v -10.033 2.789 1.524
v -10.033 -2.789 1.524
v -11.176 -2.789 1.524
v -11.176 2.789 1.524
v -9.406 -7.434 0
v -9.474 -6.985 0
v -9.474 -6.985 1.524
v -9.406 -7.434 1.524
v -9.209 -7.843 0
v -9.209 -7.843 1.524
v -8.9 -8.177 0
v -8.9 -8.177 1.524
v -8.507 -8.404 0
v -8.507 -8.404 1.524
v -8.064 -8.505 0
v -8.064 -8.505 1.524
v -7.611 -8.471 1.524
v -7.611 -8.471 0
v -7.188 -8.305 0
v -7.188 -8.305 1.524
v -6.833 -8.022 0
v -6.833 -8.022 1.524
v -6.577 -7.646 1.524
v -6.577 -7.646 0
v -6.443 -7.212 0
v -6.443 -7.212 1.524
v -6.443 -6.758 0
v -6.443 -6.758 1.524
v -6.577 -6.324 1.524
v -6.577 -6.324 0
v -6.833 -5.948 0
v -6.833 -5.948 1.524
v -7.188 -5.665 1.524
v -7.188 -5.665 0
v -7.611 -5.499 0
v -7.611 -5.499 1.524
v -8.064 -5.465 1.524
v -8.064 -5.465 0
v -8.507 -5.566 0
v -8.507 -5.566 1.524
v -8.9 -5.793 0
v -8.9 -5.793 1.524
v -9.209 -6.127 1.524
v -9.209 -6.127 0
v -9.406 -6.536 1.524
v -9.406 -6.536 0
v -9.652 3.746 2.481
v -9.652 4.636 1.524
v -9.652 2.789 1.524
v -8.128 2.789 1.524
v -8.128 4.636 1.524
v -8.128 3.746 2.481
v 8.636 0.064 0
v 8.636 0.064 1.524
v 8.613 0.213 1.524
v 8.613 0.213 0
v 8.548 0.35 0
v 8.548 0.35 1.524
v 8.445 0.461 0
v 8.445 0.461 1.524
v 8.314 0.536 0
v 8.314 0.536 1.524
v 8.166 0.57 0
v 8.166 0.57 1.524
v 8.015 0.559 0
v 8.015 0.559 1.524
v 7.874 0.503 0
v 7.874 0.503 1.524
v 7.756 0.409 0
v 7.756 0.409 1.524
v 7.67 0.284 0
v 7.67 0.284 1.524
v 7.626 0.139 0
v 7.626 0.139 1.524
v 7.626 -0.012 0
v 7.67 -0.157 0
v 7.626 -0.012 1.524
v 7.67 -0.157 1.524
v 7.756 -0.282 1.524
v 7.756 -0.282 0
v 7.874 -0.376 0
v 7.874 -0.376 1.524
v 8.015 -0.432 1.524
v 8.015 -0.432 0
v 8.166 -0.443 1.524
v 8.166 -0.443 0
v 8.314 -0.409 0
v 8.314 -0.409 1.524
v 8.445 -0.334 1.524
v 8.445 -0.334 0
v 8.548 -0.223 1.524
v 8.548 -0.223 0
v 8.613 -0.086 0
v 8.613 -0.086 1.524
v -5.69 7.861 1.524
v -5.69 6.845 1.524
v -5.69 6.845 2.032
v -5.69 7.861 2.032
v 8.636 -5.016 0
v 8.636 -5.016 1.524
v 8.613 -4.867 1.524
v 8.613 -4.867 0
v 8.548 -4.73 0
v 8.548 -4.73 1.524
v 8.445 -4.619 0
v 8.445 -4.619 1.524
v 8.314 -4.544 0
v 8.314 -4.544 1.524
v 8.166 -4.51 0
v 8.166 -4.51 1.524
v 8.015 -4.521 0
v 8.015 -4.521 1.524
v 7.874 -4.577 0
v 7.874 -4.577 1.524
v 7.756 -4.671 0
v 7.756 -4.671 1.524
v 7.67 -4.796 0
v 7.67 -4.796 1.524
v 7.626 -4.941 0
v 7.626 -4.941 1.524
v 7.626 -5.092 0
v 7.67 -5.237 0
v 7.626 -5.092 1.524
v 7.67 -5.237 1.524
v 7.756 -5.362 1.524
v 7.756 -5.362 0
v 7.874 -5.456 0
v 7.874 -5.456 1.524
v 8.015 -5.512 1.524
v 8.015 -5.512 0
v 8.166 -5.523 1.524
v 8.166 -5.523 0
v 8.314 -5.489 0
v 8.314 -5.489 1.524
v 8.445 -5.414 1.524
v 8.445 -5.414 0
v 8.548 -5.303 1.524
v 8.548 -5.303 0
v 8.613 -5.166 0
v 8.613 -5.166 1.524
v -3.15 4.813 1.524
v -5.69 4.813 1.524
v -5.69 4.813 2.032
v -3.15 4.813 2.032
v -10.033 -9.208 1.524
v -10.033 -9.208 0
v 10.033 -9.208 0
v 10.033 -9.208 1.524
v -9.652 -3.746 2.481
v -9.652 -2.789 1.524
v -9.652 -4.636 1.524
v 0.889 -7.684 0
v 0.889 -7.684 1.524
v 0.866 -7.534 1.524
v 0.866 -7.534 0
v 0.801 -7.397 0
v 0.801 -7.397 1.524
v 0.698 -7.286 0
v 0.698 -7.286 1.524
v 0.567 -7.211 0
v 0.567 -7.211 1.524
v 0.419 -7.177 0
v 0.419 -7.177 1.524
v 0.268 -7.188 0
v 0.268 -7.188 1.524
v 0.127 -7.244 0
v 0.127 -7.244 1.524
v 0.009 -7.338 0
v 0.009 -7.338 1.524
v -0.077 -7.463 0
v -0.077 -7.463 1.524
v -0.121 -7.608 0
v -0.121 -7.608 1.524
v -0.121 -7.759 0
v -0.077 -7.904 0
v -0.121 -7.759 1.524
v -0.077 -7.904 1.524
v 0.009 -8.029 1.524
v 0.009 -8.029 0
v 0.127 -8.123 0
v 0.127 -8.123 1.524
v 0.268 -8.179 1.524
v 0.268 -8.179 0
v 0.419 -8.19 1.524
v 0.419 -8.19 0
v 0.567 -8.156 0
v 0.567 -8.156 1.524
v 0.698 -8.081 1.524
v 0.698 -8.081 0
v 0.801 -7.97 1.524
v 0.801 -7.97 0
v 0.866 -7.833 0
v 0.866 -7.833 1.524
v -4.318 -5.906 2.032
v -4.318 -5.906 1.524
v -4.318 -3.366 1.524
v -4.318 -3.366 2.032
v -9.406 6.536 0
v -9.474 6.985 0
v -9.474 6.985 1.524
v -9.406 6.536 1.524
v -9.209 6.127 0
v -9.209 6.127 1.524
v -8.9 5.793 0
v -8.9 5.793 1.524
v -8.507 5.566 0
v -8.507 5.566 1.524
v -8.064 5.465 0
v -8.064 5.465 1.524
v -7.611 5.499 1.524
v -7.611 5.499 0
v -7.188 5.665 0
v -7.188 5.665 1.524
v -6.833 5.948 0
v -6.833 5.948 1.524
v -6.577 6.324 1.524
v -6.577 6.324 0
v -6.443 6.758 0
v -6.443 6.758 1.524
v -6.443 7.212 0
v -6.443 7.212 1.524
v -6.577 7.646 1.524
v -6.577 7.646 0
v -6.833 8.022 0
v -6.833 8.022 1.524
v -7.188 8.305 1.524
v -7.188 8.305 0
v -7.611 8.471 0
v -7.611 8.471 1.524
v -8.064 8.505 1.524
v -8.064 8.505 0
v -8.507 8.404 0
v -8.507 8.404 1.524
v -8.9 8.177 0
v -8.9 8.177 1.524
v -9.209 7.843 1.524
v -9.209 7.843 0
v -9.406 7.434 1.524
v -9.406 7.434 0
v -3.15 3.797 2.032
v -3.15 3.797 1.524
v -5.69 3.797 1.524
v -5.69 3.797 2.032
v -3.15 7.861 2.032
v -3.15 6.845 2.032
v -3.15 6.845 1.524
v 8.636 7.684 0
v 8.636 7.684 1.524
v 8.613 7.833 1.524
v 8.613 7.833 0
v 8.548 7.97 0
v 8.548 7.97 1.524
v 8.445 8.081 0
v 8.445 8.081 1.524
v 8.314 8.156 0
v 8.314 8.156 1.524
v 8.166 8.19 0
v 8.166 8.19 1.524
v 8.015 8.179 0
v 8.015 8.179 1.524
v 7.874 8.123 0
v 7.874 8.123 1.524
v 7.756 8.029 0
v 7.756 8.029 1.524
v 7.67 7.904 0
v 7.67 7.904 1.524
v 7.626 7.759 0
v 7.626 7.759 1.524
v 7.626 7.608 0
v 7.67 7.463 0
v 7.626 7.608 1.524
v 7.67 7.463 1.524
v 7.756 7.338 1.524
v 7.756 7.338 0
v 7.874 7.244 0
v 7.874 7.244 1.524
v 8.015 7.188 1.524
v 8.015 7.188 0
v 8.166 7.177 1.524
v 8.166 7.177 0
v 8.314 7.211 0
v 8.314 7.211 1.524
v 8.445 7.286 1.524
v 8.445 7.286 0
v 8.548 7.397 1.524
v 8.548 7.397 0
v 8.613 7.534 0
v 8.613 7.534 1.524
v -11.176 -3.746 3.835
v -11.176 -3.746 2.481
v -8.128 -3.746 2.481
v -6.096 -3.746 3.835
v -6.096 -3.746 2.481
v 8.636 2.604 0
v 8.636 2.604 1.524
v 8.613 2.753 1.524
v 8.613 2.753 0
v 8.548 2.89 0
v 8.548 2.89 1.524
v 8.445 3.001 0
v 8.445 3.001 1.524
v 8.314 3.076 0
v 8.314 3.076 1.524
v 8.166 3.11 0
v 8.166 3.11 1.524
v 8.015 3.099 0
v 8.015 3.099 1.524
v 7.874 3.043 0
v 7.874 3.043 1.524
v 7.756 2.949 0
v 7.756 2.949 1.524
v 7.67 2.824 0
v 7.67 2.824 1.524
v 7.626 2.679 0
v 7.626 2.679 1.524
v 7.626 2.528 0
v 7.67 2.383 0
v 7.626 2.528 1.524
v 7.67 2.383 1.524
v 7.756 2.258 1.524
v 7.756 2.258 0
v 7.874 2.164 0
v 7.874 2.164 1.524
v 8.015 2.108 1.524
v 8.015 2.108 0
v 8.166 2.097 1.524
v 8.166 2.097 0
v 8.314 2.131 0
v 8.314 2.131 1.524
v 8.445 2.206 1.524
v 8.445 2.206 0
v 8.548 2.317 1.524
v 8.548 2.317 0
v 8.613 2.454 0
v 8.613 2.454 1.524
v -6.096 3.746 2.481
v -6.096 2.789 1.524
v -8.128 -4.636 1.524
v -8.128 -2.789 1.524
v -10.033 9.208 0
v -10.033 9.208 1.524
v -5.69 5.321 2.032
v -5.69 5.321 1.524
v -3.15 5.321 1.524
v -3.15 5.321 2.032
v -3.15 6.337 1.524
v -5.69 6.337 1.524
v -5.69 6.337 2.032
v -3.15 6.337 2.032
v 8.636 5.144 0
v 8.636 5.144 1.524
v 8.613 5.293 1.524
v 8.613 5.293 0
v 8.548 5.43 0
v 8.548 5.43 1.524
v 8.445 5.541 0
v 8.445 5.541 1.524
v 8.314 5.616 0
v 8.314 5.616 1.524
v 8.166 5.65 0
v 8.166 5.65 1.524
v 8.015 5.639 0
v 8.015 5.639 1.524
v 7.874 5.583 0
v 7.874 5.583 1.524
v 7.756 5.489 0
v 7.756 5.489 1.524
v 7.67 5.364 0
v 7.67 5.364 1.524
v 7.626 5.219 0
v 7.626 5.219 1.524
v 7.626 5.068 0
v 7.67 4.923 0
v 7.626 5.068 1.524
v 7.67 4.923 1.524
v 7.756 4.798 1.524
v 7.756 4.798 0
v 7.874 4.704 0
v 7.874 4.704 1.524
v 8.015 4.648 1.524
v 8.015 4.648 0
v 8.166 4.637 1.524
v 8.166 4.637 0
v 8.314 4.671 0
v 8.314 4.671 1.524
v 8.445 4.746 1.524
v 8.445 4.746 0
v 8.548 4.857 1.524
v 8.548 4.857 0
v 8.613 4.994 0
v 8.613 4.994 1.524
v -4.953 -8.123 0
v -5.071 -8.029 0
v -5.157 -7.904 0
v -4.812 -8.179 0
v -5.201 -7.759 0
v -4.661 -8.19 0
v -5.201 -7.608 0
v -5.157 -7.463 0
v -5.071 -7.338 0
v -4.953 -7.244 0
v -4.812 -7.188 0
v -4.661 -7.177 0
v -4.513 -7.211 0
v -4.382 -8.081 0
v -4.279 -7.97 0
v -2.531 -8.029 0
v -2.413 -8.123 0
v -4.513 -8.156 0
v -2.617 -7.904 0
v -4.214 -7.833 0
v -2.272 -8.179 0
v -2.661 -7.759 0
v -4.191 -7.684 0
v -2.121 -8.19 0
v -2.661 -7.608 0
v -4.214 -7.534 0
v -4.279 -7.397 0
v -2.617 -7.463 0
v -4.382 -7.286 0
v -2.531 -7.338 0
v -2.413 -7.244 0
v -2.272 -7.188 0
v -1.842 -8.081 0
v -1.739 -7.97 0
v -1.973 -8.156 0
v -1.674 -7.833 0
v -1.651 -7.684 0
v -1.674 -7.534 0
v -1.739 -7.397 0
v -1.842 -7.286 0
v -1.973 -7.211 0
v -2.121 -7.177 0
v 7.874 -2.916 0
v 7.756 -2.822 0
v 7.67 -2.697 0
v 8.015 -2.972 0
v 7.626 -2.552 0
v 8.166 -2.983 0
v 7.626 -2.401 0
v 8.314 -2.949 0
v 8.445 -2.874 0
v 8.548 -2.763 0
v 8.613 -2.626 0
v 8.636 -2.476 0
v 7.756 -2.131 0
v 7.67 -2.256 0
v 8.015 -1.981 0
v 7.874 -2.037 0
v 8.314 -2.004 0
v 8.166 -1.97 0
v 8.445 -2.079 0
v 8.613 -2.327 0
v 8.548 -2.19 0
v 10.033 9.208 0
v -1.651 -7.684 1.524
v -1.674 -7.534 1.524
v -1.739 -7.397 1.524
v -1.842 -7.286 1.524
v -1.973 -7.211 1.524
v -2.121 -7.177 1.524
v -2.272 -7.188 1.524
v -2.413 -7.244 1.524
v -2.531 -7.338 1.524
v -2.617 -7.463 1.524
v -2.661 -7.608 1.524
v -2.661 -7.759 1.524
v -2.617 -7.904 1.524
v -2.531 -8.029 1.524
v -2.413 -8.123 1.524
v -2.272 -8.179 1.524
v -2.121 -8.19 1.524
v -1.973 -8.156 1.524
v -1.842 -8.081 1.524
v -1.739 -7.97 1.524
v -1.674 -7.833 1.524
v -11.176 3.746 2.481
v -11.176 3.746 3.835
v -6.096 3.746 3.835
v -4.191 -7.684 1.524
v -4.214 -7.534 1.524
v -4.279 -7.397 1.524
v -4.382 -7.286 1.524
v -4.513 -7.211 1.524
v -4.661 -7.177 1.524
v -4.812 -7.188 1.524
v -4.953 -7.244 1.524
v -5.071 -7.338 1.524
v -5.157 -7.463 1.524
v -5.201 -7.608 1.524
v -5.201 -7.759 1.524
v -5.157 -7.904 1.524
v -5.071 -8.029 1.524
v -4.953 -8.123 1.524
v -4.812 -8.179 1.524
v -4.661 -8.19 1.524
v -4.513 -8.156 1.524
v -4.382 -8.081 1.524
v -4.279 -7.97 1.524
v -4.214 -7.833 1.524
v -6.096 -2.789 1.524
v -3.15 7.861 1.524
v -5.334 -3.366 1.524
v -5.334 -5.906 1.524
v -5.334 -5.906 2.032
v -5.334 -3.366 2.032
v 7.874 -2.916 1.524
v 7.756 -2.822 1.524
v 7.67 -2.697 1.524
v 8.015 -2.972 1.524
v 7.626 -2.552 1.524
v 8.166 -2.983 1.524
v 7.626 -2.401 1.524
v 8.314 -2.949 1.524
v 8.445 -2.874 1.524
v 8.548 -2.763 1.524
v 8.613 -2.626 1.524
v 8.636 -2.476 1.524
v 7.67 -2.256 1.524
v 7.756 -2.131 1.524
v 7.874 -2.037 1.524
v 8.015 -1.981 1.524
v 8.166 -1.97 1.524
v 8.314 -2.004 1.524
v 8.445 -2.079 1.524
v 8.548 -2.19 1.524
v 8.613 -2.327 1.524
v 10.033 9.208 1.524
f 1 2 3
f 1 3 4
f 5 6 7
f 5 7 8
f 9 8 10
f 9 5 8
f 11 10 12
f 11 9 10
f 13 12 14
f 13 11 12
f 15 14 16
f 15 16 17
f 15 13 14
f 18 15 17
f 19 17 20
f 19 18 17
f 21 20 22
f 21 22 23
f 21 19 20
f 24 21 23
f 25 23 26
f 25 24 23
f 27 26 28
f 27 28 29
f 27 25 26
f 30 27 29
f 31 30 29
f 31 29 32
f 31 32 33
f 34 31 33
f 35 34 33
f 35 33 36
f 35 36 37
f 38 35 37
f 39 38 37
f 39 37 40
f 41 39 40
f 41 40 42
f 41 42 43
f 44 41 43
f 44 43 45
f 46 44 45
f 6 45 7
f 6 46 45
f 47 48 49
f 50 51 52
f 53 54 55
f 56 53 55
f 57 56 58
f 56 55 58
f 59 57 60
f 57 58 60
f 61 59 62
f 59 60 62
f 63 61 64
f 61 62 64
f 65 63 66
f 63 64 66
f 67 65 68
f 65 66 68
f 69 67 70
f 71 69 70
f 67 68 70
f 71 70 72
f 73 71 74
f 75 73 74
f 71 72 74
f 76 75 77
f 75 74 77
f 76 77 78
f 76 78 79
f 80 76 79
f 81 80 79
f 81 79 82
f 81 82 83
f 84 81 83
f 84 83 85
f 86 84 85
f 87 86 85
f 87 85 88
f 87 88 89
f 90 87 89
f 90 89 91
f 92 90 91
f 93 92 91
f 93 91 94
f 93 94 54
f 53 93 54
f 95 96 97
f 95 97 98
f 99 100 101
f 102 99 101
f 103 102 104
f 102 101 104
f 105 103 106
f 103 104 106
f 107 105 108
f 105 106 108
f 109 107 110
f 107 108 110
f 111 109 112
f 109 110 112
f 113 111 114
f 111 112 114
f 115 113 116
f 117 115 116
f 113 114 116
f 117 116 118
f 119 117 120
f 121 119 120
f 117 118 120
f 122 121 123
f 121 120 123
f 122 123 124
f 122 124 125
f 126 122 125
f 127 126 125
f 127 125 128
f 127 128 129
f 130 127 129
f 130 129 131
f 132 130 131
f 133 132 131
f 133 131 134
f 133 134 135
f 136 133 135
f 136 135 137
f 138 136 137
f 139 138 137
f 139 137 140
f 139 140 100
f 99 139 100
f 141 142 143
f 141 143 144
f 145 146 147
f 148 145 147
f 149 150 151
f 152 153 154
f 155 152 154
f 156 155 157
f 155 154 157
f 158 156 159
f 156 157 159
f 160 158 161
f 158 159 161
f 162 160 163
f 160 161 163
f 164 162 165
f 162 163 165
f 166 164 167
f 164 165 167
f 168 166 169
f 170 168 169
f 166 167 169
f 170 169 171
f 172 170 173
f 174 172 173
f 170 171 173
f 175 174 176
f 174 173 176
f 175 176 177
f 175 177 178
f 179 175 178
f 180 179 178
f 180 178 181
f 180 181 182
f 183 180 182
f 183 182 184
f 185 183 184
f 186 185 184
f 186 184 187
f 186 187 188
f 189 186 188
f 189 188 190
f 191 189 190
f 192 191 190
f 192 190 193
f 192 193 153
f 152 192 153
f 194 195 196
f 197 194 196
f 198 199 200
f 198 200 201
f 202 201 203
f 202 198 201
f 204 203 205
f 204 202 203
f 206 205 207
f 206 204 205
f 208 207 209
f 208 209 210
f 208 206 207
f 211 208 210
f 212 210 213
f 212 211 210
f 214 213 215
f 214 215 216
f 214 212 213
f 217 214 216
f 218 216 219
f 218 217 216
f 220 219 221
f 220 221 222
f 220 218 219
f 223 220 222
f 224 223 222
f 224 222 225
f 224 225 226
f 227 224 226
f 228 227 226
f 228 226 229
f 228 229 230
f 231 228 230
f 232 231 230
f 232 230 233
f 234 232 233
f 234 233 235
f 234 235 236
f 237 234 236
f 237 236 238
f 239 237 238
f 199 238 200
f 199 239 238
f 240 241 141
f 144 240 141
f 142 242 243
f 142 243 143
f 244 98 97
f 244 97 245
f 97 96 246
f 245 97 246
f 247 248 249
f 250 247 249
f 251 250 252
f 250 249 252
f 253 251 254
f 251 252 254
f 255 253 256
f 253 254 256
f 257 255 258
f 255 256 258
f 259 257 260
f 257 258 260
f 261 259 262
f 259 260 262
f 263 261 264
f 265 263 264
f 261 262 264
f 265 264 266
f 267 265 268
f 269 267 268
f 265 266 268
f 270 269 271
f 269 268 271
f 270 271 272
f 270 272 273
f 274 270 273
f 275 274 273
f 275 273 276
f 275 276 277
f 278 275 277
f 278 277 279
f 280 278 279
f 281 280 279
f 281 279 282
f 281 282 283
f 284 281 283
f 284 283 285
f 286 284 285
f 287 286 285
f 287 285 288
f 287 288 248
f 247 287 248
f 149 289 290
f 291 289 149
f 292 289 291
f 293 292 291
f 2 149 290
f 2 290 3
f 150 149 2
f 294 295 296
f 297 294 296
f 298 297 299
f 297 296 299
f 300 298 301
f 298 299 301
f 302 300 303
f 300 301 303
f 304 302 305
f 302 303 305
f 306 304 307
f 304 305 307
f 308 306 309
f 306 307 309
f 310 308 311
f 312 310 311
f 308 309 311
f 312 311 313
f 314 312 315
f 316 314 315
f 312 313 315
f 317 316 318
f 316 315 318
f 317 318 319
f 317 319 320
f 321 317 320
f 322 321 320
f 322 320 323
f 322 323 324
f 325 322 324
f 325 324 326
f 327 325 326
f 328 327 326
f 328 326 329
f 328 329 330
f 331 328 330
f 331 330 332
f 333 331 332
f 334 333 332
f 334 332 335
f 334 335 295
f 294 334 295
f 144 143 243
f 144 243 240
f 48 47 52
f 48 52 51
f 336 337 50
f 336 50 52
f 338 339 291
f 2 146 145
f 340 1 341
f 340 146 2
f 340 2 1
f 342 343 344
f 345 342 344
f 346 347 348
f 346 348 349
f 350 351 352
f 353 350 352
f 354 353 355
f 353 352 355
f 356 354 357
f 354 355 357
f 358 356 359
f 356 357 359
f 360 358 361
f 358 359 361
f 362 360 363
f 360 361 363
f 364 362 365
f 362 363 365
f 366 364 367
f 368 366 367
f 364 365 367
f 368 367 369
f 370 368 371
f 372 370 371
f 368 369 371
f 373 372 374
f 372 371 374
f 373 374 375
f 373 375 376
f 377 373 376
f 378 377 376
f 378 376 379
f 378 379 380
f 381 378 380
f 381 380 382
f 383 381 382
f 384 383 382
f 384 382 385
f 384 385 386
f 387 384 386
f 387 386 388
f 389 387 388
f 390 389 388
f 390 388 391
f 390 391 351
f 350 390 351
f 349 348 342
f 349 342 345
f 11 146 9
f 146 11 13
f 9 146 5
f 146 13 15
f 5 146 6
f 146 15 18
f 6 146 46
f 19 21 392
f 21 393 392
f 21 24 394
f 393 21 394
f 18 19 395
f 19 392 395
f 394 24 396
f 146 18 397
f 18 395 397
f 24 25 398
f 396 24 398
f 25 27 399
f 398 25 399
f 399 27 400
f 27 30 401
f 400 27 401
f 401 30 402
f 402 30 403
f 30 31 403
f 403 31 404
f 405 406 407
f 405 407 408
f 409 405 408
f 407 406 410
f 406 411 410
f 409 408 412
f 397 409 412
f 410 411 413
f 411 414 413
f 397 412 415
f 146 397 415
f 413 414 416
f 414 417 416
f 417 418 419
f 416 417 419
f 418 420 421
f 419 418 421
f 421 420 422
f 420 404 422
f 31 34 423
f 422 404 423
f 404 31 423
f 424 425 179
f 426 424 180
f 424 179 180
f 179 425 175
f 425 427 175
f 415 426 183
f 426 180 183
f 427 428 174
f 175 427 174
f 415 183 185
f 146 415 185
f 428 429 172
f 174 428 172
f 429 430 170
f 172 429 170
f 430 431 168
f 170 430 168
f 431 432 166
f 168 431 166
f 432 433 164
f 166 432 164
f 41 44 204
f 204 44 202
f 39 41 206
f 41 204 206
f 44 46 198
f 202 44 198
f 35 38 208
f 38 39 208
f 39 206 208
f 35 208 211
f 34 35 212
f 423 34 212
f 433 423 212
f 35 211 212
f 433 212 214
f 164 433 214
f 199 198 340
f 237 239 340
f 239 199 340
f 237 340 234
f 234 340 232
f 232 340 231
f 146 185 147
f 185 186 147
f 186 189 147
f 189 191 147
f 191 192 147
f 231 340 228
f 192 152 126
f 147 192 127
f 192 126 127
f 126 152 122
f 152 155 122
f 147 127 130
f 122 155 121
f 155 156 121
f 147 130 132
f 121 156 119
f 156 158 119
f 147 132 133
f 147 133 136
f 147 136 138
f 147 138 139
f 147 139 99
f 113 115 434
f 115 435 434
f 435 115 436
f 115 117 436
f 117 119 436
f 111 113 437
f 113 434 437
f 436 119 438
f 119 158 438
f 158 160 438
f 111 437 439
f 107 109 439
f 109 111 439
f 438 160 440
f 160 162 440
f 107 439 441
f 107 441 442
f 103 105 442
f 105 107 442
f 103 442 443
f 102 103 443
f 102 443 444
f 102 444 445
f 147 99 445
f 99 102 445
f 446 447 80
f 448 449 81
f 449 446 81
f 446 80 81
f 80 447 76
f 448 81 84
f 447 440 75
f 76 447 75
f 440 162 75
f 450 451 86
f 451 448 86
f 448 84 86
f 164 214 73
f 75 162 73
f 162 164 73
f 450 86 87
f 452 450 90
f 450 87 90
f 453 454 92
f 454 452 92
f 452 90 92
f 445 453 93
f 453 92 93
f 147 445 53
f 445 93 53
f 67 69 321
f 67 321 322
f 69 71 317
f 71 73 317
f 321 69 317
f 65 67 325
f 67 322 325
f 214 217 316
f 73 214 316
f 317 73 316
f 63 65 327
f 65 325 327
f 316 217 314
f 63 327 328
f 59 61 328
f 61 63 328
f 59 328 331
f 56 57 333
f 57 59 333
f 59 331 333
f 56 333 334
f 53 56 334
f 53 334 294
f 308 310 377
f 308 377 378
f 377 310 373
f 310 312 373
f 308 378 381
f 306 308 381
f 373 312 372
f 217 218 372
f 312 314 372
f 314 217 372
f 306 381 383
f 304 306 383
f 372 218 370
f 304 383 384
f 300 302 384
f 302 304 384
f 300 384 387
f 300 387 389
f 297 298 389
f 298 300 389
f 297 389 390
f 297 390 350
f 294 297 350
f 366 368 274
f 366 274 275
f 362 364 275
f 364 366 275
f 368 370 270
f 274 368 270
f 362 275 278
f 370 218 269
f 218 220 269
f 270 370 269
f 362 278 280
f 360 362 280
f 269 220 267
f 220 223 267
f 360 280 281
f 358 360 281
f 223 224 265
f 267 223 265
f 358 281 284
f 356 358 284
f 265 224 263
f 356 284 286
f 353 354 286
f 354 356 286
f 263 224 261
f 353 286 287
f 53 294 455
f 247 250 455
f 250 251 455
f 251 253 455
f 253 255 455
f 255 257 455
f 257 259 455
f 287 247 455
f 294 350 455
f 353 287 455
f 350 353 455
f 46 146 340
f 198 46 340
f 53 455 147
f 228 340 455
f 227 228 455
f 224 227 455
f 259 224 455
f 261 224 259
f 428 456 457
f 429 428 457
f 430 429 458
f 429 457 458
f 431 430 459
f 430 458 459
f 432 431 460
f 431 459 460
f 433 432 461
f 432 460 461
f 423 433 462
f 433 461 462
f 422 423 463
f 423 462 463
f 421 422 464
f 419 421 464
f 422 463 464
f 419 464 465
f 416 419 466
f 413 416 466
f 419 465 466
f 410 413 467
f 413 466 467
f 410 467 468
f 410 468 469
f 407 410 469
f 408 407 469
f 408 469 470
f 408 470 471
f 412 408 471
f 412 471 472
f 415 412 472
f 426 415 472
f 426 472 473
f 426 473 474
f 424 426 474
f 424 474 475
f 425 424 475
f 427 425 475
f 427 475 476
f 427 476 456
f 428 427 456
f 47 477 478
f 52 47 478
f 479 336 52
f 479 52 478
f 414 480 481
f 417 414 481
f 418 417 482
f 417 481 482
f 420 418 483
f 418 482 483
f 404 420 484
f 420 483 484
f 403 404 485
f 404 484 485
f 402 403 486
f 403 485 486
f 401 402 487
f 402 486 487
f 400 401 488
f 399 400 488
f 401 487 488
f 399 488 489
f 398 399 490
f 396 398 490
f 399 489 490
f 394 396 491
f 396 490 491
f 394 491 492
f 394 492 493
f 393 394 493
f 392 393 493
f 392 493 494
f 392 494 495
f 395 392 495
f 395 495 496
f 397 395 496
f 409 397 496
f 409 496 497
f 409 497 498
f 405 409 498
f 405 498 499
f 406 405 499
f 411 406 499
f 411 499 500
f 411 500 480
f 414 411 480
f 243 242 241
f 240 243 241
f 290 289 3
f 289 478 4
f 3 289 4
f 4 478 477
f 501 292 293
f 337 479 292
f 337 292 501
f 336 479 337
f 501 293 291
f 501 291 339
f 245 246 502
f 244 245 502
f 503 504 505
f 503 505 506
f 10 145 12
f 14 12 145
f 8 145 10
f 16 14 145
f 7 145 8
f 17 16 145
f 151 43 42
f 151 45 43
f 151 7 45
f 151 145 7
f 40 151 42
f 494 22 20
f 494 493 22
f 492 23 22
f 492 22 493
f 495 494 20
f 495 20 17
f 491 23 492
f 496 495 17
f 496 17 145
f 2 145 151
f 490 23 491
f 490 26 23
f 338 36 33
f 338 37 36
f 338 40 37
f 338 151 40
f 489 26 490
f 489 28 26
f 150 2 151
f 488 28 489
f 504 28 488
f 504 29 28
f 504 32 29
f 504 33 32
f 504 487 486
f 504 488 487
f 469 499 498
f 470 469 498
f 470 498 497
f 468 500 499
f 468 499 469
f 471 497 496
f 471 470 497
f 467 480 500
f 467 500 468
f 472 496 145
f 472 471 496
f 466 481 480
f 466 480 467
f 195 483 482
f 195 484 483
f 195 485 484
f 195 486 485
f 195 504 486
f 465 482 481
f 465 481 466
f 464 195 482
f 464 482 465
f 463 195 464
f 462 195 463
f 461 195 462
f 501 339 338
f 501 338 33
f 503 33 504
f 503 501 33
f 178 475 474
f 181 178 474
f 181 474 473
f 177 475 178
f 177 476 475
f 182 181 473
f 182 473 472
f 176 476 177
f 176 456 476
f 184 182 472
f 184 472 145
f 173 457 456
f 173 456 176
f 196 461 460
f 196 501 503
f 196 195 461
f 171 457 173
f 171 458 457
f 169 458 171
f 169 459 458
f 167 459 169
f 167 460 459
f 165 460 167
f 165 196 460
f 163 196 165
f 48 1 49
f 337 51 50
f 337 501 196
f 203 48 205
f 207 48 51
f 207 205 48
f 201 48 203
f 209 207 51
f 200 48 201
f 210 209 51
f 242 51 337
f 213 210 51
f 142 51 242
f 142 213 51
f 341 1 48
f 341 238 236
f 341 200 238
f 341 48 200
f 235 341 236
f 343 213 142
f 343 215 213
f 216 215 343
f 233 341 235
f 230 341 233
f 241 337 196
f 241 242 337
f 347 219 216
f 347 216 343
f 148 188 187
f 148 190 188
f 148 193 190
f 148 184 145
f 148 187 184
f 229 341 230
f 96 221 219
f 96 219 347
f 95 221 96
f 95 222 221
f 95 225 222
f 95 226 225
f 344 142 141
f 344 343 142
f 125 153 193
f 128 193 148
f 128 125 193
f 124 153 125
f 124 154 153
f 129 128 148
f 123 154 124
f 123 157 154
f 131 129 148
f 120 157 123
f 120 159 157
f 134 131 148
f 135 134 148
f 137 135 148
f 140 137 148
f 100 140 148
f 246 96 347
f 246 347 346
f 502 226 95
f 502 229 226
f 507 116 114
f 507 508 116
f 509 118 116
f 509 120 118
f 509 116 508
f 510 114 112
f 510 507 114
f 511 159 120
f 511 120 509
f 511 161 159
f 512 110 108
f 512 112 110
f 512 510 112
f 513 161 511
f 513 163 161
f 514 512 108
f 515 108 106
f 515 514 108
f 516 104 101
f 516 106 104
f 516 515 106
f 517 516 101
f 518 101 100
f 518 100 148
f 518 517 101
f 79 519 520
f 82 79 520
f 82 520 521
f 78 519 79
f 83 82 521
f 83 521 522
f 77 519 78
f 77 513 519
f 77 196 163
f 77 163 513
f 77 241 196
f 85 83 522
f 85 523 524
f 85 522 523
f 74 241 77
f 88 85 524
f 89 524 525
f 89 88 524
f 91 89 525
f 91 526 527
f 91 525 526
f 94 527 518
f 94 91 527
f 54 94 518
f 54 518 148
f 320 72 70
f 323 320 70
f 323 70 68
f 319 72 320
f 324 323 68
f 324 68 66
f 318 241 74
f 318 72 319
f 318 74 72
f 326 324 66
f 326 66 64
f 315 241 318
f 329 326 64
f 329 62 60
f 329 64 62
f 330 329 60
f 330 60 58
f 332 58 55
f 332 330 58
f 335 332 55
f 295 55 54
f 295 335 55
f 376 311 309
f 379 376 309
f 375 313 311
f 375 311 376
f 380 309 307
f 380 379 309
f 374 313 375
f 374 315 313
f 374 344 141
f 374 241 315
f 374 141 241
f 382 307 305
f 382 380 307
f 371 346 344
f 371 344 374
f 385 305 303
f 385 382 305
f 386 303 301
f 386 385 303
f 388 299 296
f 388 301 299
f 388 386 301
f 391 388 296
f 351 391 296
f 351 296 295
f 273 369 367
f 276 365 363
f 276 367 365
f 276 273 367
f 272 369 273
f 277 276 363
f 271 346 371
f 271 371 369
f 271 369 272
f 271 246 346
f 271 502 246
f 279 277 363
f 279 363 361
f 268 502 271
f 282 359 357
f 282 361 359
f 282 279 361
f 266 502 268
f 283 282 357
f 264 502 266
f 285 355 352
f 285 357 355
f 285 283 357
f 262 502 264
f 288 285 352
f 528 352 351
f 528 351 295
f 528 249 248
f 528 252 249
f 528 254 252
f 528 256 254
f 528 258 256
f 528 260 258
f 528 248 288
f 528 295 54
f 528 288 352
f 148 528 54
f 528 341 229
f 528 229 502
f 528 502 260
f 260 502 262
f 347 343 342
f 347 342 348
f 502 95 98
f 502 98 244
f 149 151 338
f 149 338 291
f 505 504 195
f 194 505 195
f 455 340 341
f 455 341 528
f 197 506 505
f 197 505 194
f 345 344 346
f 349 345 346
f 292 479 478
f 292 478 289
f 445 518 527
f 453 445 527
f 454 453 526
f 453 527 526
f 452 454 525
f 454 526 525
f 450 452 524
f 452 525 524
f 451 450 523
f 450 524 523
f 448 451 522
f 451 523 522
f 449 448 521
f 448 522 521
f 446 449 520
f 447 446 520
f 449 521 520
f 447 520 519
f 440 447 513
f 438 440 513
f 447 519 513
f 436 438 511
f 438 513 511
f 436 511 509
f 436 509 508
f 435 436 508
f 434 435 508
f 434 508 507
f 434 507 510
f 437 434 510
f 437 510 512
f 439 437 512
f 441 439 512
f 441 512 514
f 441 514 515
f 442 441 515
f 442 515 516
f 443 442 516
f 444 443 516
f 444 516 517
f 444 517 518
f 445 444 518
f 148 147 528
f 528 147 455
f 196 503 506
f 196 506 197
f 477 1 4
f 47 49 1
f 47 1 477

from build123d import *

# Parameters (mm, degrees)
SKETCH1_W           = 20.066
SKETCH1_H           = 18.415
SKETCH1_R           = 1.524
EXTRUDE1_DEPTH      = 1.524
EXTRUDE2_DEPTH      = 1.143
EXTRUDE2_DEPTH_BACK = 3.937
SKETCH3_R           = 0.508
EXTRUDE3_DEPTH      = 15.663683105
LPATTERN1_COUNT     = 6
LPATTERN1_PITCH     = 2.54
SKETCH4_R           = 0.508
EXTRUDE4_DEPTH      = 15.663683105
LPATTERN2_COUNT     = 3
LPATTERN2_PITCH     = 2.54
SKETCH5_W           = 2.54
SKETCH5_H           = 1.016
SKETCH5_W_2         = 1.016
SKETCH5_H_2         = 2.54
KEEPAWAY_DEPTH      = 0.508
EXTRUDE6_START      = -1.524
EXTRUDE6_DEPTH      = 1.524


with BuildPart() as part:
    # Sketch1 → Extrude1 (new body)
    with BuildSketch(Plane.XY):
        Rectangle(SKETCH1_W, SKETCH1_H)
        with Locations(Location((-7.9502, 6.985, 0), (0, 0, 180))):
            Circle(SKETCH1_R, mode=Mode.SUBTRACT)
        with Locations(Location((-7.9502, -6.985, 0), (0, 0, 180))):
            Circle(SKETCH1_R, mode=Mode.SUBTRACT)
    extrude(amount=EXTRUDE1_DEPTH)

    # Sketch2 → Extrude2 (add, two sides: drawn at the far end of the back side and taken through both)
    with BuildSketch(Plane.ZY.offset(10.033).offset(-EXTRUDE2_DEPTH_BACK)):
        Polygon((3.8354, 3.7465), (3.8354, -3.7465), (2.481413228, -3.7465), (1.524, -2.789086772), (1.524, 2.789086772), (2.481413228, 3.7465), align=None)
    extrude(amount=EXTRUDE2_DEPTH + EXTRUDE2_DEPTH_BACK)

    # Sketch3 → Extrude3 (cut, through all)
    with BuildSketch(Plane.XY.offset(1.524)):
        with Locations((8.128, 7.6835)):
            Circle(SKETCH3_R)
    extrude3 = extrude(amount=-EXTRUDE3_DEPTH, mode=Mode.SUBTRACT)

    # LPattern1: Extrude3 ×6
    with Locations(*[(0, -i * LPATTERN1_PITCH, 0) for i in range(1, LPATTERN1_COUNT)]):
        add(extrude3, mode=Mode.SUBTRACT)

    # Sketch4 → Extrude4 (cut, through all)
    with BuildSketch(Plane.XY.offset(1.524)):
        with Locations((-4.699, -7.6835)):
            Circle(SKETCH4_R)
    extrude4 = extrude(amount=-EXTRUDE4_DEPTH, mode=Mode.SUBTRACT)

    # LPattern2: Extrude4 ×3
    with Locations(*[(i * LPATTERN2_PITCH, 0, 0) for i in range(1, LPATTERN2_COUNT)]):
        add(extrude4, mode=Mode.SUBTRACT)

    # Sketch5 → KeepAway (add)
    with BuildSketch(Plane.XY.offset(1.524)):
        with Locations((-4.4196, 7.3533)):
            Rectangle(SKETCH5_W, SKETCH5_H)
        with Locations((-4.4196, 5.8293)):
            Rectangle(SKETCH5_W, SKETCH5_H)
        with Locations((-4.4196, 4.3053)):
            Rectangle(SKETCH5_W, SKETCH5_H)
        with Locations((-4.826, -4.6355)):
            Rectangle(SKETCH5_W_2, SKETCH5_H_2)
    extrude(amount=KEEPAWAY_DEPTH)

    # Sketch6 → Extrude6 (add)
    with BuildSketch(Plane.ZY.offset(11.176).offset(EXTRUDE6_START)):
        Polygon((1.524, 4.6355), (1.524, 2.789086772), (2.481413228, 3.7465), align=None)
        Polygon((1.524, -2.789086772), (1.524, -4.6355), (2.481413228, -3.7465), align=None)
    extrude(amount=-EXTRUDE6_DEPTH)


solid = part.part
